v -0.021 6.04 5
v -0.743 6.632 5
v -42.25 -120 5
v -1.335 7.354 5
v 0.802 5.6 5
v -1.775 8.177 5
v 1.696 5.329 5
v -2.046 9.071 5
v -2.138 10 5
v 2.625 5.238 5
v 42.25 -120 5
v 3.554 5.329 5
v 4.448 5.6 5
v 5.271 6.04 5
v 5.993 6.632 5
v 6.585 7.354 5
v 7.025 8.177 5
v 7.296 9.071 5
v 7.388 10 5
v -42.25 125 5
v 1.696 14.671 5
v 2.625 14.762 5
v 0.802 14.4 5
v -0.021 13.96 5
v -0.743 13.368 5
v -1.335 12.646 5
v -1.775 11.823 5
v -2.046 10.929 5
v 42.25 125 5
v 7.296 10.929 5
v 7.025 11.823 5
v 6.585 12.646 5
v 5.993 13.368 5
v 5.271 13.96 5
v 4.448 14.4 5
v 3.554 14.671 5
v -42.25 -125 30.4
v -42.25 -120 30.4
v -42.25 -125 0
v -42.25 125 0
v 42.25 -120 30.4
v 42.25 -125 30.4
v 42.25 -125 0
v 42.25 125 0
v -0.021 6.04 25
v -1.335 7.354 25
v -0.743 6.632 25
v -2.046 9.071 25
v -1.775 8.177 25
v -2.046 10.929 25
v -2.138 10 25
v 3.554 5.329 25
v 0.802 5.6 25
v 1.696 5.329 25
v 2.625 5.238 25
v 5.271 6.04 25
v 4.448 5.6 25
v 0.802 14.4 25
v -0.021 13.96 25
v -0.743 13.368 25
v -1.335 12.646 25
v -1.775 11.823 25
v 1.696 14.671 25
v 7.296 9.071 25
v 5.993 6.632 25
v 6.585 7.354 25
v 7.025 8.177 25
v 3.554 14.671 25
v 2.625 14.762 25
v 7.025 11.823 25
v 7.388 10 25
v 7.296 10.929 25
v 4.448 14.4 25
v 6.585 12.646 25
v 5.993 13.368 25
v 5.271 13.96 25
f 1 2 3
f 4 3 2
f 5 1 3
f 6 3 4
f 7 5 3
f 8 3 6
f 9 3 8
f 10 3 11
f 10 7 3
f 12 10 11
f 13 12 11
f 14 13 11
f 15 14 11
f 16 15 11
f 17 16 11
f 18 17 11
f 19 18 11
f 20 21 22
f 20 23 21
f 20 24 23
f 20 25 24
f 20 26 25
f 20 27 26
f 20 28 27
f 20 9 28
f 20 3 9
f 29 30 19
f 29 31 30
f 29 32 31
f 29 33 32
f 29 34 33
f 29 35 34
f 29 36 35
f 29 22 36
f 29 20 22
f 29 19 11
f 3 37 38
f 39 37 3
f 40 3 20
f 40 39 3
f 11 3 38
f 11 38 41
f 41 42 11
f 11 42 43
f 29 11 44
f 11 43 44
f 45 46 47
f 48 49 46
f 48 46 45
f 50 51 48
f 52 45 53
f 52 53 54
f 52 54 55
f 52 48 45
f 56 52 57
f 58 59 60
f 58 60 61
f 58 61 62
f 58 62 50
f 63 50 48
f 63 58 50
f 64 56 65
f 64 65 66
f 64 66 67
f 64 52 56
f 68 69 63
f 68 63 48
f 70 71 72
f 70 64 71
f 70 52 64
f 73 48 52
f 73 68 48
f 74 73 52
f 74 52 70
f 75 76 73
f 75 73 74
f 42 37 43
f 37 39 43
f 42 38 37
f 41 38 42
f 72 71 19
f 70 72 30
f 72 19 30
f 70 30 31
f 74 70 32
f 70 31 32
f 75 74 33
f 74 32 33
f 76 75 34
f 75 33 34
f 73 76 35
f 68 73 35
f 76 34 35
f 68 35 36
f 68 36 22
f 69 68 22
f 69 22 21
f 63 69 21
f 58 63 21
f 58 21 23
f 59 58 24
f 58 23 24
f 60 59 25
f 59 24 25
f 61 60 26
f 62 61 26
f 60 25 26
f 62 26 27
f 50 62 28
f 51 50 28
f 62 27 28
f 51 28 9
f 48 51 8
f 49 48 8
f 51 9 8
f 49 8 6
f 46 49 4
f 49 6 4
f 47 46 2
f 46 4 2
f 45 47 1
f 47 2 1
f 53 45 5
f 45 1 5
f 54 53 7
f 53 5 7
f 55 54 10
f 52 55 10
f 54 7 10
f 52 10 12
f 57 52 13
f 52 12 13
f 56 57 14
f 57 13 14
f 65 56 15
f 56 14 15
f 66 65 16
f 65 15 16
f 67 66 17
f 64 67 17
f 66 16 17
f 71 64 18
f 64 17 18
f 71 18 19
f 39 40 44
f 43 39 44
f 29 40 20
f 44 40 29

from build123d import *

# Parameters (mm, degrees)
SKETCH1_W           = 84.5
SKETCH1_H           = 250
BOSS_EXTRUDE1_DEPTH = 5
SKETCH2_W           = 84.5
SKETCH2_H           = 5
BOSS_EXTRUDE2_DEPTH = 25.4
SKETCH3_R           = 4.7625
BOSS_EXTRUDE3_DEPTH = 20


with BuildPart() as part:
    # Sketch1 → Boss-Extrude1 (new body)
    with BuildSketch(Plane.XY):
        Rectangle(SKETCH1_W, SKETCH1_H)
    extrude(amount=BOSS_EXTRUDE1_DEPTH)

    # Sketch2 → Boss-Extrude2 (add)
    with BuildSketch(Plane.XY.offset(5)):
        with Locations((0, -122.5)):
            Rectangle(SKETCH2_W, SKETCH2_H)
    extrude(amount=BOSS_EXTRUDE2_DEPTH)

    # Sketch3 → Boss-Extrude3 (add)
    with BuildSketch(Plane.XY.offset(5)):
        with Locations((2.625, 10)):
            Circle(SKETCH3_R)
    extrude(amount=BOSS_EXTRUDE3_DEPTH)


solid = part.part
